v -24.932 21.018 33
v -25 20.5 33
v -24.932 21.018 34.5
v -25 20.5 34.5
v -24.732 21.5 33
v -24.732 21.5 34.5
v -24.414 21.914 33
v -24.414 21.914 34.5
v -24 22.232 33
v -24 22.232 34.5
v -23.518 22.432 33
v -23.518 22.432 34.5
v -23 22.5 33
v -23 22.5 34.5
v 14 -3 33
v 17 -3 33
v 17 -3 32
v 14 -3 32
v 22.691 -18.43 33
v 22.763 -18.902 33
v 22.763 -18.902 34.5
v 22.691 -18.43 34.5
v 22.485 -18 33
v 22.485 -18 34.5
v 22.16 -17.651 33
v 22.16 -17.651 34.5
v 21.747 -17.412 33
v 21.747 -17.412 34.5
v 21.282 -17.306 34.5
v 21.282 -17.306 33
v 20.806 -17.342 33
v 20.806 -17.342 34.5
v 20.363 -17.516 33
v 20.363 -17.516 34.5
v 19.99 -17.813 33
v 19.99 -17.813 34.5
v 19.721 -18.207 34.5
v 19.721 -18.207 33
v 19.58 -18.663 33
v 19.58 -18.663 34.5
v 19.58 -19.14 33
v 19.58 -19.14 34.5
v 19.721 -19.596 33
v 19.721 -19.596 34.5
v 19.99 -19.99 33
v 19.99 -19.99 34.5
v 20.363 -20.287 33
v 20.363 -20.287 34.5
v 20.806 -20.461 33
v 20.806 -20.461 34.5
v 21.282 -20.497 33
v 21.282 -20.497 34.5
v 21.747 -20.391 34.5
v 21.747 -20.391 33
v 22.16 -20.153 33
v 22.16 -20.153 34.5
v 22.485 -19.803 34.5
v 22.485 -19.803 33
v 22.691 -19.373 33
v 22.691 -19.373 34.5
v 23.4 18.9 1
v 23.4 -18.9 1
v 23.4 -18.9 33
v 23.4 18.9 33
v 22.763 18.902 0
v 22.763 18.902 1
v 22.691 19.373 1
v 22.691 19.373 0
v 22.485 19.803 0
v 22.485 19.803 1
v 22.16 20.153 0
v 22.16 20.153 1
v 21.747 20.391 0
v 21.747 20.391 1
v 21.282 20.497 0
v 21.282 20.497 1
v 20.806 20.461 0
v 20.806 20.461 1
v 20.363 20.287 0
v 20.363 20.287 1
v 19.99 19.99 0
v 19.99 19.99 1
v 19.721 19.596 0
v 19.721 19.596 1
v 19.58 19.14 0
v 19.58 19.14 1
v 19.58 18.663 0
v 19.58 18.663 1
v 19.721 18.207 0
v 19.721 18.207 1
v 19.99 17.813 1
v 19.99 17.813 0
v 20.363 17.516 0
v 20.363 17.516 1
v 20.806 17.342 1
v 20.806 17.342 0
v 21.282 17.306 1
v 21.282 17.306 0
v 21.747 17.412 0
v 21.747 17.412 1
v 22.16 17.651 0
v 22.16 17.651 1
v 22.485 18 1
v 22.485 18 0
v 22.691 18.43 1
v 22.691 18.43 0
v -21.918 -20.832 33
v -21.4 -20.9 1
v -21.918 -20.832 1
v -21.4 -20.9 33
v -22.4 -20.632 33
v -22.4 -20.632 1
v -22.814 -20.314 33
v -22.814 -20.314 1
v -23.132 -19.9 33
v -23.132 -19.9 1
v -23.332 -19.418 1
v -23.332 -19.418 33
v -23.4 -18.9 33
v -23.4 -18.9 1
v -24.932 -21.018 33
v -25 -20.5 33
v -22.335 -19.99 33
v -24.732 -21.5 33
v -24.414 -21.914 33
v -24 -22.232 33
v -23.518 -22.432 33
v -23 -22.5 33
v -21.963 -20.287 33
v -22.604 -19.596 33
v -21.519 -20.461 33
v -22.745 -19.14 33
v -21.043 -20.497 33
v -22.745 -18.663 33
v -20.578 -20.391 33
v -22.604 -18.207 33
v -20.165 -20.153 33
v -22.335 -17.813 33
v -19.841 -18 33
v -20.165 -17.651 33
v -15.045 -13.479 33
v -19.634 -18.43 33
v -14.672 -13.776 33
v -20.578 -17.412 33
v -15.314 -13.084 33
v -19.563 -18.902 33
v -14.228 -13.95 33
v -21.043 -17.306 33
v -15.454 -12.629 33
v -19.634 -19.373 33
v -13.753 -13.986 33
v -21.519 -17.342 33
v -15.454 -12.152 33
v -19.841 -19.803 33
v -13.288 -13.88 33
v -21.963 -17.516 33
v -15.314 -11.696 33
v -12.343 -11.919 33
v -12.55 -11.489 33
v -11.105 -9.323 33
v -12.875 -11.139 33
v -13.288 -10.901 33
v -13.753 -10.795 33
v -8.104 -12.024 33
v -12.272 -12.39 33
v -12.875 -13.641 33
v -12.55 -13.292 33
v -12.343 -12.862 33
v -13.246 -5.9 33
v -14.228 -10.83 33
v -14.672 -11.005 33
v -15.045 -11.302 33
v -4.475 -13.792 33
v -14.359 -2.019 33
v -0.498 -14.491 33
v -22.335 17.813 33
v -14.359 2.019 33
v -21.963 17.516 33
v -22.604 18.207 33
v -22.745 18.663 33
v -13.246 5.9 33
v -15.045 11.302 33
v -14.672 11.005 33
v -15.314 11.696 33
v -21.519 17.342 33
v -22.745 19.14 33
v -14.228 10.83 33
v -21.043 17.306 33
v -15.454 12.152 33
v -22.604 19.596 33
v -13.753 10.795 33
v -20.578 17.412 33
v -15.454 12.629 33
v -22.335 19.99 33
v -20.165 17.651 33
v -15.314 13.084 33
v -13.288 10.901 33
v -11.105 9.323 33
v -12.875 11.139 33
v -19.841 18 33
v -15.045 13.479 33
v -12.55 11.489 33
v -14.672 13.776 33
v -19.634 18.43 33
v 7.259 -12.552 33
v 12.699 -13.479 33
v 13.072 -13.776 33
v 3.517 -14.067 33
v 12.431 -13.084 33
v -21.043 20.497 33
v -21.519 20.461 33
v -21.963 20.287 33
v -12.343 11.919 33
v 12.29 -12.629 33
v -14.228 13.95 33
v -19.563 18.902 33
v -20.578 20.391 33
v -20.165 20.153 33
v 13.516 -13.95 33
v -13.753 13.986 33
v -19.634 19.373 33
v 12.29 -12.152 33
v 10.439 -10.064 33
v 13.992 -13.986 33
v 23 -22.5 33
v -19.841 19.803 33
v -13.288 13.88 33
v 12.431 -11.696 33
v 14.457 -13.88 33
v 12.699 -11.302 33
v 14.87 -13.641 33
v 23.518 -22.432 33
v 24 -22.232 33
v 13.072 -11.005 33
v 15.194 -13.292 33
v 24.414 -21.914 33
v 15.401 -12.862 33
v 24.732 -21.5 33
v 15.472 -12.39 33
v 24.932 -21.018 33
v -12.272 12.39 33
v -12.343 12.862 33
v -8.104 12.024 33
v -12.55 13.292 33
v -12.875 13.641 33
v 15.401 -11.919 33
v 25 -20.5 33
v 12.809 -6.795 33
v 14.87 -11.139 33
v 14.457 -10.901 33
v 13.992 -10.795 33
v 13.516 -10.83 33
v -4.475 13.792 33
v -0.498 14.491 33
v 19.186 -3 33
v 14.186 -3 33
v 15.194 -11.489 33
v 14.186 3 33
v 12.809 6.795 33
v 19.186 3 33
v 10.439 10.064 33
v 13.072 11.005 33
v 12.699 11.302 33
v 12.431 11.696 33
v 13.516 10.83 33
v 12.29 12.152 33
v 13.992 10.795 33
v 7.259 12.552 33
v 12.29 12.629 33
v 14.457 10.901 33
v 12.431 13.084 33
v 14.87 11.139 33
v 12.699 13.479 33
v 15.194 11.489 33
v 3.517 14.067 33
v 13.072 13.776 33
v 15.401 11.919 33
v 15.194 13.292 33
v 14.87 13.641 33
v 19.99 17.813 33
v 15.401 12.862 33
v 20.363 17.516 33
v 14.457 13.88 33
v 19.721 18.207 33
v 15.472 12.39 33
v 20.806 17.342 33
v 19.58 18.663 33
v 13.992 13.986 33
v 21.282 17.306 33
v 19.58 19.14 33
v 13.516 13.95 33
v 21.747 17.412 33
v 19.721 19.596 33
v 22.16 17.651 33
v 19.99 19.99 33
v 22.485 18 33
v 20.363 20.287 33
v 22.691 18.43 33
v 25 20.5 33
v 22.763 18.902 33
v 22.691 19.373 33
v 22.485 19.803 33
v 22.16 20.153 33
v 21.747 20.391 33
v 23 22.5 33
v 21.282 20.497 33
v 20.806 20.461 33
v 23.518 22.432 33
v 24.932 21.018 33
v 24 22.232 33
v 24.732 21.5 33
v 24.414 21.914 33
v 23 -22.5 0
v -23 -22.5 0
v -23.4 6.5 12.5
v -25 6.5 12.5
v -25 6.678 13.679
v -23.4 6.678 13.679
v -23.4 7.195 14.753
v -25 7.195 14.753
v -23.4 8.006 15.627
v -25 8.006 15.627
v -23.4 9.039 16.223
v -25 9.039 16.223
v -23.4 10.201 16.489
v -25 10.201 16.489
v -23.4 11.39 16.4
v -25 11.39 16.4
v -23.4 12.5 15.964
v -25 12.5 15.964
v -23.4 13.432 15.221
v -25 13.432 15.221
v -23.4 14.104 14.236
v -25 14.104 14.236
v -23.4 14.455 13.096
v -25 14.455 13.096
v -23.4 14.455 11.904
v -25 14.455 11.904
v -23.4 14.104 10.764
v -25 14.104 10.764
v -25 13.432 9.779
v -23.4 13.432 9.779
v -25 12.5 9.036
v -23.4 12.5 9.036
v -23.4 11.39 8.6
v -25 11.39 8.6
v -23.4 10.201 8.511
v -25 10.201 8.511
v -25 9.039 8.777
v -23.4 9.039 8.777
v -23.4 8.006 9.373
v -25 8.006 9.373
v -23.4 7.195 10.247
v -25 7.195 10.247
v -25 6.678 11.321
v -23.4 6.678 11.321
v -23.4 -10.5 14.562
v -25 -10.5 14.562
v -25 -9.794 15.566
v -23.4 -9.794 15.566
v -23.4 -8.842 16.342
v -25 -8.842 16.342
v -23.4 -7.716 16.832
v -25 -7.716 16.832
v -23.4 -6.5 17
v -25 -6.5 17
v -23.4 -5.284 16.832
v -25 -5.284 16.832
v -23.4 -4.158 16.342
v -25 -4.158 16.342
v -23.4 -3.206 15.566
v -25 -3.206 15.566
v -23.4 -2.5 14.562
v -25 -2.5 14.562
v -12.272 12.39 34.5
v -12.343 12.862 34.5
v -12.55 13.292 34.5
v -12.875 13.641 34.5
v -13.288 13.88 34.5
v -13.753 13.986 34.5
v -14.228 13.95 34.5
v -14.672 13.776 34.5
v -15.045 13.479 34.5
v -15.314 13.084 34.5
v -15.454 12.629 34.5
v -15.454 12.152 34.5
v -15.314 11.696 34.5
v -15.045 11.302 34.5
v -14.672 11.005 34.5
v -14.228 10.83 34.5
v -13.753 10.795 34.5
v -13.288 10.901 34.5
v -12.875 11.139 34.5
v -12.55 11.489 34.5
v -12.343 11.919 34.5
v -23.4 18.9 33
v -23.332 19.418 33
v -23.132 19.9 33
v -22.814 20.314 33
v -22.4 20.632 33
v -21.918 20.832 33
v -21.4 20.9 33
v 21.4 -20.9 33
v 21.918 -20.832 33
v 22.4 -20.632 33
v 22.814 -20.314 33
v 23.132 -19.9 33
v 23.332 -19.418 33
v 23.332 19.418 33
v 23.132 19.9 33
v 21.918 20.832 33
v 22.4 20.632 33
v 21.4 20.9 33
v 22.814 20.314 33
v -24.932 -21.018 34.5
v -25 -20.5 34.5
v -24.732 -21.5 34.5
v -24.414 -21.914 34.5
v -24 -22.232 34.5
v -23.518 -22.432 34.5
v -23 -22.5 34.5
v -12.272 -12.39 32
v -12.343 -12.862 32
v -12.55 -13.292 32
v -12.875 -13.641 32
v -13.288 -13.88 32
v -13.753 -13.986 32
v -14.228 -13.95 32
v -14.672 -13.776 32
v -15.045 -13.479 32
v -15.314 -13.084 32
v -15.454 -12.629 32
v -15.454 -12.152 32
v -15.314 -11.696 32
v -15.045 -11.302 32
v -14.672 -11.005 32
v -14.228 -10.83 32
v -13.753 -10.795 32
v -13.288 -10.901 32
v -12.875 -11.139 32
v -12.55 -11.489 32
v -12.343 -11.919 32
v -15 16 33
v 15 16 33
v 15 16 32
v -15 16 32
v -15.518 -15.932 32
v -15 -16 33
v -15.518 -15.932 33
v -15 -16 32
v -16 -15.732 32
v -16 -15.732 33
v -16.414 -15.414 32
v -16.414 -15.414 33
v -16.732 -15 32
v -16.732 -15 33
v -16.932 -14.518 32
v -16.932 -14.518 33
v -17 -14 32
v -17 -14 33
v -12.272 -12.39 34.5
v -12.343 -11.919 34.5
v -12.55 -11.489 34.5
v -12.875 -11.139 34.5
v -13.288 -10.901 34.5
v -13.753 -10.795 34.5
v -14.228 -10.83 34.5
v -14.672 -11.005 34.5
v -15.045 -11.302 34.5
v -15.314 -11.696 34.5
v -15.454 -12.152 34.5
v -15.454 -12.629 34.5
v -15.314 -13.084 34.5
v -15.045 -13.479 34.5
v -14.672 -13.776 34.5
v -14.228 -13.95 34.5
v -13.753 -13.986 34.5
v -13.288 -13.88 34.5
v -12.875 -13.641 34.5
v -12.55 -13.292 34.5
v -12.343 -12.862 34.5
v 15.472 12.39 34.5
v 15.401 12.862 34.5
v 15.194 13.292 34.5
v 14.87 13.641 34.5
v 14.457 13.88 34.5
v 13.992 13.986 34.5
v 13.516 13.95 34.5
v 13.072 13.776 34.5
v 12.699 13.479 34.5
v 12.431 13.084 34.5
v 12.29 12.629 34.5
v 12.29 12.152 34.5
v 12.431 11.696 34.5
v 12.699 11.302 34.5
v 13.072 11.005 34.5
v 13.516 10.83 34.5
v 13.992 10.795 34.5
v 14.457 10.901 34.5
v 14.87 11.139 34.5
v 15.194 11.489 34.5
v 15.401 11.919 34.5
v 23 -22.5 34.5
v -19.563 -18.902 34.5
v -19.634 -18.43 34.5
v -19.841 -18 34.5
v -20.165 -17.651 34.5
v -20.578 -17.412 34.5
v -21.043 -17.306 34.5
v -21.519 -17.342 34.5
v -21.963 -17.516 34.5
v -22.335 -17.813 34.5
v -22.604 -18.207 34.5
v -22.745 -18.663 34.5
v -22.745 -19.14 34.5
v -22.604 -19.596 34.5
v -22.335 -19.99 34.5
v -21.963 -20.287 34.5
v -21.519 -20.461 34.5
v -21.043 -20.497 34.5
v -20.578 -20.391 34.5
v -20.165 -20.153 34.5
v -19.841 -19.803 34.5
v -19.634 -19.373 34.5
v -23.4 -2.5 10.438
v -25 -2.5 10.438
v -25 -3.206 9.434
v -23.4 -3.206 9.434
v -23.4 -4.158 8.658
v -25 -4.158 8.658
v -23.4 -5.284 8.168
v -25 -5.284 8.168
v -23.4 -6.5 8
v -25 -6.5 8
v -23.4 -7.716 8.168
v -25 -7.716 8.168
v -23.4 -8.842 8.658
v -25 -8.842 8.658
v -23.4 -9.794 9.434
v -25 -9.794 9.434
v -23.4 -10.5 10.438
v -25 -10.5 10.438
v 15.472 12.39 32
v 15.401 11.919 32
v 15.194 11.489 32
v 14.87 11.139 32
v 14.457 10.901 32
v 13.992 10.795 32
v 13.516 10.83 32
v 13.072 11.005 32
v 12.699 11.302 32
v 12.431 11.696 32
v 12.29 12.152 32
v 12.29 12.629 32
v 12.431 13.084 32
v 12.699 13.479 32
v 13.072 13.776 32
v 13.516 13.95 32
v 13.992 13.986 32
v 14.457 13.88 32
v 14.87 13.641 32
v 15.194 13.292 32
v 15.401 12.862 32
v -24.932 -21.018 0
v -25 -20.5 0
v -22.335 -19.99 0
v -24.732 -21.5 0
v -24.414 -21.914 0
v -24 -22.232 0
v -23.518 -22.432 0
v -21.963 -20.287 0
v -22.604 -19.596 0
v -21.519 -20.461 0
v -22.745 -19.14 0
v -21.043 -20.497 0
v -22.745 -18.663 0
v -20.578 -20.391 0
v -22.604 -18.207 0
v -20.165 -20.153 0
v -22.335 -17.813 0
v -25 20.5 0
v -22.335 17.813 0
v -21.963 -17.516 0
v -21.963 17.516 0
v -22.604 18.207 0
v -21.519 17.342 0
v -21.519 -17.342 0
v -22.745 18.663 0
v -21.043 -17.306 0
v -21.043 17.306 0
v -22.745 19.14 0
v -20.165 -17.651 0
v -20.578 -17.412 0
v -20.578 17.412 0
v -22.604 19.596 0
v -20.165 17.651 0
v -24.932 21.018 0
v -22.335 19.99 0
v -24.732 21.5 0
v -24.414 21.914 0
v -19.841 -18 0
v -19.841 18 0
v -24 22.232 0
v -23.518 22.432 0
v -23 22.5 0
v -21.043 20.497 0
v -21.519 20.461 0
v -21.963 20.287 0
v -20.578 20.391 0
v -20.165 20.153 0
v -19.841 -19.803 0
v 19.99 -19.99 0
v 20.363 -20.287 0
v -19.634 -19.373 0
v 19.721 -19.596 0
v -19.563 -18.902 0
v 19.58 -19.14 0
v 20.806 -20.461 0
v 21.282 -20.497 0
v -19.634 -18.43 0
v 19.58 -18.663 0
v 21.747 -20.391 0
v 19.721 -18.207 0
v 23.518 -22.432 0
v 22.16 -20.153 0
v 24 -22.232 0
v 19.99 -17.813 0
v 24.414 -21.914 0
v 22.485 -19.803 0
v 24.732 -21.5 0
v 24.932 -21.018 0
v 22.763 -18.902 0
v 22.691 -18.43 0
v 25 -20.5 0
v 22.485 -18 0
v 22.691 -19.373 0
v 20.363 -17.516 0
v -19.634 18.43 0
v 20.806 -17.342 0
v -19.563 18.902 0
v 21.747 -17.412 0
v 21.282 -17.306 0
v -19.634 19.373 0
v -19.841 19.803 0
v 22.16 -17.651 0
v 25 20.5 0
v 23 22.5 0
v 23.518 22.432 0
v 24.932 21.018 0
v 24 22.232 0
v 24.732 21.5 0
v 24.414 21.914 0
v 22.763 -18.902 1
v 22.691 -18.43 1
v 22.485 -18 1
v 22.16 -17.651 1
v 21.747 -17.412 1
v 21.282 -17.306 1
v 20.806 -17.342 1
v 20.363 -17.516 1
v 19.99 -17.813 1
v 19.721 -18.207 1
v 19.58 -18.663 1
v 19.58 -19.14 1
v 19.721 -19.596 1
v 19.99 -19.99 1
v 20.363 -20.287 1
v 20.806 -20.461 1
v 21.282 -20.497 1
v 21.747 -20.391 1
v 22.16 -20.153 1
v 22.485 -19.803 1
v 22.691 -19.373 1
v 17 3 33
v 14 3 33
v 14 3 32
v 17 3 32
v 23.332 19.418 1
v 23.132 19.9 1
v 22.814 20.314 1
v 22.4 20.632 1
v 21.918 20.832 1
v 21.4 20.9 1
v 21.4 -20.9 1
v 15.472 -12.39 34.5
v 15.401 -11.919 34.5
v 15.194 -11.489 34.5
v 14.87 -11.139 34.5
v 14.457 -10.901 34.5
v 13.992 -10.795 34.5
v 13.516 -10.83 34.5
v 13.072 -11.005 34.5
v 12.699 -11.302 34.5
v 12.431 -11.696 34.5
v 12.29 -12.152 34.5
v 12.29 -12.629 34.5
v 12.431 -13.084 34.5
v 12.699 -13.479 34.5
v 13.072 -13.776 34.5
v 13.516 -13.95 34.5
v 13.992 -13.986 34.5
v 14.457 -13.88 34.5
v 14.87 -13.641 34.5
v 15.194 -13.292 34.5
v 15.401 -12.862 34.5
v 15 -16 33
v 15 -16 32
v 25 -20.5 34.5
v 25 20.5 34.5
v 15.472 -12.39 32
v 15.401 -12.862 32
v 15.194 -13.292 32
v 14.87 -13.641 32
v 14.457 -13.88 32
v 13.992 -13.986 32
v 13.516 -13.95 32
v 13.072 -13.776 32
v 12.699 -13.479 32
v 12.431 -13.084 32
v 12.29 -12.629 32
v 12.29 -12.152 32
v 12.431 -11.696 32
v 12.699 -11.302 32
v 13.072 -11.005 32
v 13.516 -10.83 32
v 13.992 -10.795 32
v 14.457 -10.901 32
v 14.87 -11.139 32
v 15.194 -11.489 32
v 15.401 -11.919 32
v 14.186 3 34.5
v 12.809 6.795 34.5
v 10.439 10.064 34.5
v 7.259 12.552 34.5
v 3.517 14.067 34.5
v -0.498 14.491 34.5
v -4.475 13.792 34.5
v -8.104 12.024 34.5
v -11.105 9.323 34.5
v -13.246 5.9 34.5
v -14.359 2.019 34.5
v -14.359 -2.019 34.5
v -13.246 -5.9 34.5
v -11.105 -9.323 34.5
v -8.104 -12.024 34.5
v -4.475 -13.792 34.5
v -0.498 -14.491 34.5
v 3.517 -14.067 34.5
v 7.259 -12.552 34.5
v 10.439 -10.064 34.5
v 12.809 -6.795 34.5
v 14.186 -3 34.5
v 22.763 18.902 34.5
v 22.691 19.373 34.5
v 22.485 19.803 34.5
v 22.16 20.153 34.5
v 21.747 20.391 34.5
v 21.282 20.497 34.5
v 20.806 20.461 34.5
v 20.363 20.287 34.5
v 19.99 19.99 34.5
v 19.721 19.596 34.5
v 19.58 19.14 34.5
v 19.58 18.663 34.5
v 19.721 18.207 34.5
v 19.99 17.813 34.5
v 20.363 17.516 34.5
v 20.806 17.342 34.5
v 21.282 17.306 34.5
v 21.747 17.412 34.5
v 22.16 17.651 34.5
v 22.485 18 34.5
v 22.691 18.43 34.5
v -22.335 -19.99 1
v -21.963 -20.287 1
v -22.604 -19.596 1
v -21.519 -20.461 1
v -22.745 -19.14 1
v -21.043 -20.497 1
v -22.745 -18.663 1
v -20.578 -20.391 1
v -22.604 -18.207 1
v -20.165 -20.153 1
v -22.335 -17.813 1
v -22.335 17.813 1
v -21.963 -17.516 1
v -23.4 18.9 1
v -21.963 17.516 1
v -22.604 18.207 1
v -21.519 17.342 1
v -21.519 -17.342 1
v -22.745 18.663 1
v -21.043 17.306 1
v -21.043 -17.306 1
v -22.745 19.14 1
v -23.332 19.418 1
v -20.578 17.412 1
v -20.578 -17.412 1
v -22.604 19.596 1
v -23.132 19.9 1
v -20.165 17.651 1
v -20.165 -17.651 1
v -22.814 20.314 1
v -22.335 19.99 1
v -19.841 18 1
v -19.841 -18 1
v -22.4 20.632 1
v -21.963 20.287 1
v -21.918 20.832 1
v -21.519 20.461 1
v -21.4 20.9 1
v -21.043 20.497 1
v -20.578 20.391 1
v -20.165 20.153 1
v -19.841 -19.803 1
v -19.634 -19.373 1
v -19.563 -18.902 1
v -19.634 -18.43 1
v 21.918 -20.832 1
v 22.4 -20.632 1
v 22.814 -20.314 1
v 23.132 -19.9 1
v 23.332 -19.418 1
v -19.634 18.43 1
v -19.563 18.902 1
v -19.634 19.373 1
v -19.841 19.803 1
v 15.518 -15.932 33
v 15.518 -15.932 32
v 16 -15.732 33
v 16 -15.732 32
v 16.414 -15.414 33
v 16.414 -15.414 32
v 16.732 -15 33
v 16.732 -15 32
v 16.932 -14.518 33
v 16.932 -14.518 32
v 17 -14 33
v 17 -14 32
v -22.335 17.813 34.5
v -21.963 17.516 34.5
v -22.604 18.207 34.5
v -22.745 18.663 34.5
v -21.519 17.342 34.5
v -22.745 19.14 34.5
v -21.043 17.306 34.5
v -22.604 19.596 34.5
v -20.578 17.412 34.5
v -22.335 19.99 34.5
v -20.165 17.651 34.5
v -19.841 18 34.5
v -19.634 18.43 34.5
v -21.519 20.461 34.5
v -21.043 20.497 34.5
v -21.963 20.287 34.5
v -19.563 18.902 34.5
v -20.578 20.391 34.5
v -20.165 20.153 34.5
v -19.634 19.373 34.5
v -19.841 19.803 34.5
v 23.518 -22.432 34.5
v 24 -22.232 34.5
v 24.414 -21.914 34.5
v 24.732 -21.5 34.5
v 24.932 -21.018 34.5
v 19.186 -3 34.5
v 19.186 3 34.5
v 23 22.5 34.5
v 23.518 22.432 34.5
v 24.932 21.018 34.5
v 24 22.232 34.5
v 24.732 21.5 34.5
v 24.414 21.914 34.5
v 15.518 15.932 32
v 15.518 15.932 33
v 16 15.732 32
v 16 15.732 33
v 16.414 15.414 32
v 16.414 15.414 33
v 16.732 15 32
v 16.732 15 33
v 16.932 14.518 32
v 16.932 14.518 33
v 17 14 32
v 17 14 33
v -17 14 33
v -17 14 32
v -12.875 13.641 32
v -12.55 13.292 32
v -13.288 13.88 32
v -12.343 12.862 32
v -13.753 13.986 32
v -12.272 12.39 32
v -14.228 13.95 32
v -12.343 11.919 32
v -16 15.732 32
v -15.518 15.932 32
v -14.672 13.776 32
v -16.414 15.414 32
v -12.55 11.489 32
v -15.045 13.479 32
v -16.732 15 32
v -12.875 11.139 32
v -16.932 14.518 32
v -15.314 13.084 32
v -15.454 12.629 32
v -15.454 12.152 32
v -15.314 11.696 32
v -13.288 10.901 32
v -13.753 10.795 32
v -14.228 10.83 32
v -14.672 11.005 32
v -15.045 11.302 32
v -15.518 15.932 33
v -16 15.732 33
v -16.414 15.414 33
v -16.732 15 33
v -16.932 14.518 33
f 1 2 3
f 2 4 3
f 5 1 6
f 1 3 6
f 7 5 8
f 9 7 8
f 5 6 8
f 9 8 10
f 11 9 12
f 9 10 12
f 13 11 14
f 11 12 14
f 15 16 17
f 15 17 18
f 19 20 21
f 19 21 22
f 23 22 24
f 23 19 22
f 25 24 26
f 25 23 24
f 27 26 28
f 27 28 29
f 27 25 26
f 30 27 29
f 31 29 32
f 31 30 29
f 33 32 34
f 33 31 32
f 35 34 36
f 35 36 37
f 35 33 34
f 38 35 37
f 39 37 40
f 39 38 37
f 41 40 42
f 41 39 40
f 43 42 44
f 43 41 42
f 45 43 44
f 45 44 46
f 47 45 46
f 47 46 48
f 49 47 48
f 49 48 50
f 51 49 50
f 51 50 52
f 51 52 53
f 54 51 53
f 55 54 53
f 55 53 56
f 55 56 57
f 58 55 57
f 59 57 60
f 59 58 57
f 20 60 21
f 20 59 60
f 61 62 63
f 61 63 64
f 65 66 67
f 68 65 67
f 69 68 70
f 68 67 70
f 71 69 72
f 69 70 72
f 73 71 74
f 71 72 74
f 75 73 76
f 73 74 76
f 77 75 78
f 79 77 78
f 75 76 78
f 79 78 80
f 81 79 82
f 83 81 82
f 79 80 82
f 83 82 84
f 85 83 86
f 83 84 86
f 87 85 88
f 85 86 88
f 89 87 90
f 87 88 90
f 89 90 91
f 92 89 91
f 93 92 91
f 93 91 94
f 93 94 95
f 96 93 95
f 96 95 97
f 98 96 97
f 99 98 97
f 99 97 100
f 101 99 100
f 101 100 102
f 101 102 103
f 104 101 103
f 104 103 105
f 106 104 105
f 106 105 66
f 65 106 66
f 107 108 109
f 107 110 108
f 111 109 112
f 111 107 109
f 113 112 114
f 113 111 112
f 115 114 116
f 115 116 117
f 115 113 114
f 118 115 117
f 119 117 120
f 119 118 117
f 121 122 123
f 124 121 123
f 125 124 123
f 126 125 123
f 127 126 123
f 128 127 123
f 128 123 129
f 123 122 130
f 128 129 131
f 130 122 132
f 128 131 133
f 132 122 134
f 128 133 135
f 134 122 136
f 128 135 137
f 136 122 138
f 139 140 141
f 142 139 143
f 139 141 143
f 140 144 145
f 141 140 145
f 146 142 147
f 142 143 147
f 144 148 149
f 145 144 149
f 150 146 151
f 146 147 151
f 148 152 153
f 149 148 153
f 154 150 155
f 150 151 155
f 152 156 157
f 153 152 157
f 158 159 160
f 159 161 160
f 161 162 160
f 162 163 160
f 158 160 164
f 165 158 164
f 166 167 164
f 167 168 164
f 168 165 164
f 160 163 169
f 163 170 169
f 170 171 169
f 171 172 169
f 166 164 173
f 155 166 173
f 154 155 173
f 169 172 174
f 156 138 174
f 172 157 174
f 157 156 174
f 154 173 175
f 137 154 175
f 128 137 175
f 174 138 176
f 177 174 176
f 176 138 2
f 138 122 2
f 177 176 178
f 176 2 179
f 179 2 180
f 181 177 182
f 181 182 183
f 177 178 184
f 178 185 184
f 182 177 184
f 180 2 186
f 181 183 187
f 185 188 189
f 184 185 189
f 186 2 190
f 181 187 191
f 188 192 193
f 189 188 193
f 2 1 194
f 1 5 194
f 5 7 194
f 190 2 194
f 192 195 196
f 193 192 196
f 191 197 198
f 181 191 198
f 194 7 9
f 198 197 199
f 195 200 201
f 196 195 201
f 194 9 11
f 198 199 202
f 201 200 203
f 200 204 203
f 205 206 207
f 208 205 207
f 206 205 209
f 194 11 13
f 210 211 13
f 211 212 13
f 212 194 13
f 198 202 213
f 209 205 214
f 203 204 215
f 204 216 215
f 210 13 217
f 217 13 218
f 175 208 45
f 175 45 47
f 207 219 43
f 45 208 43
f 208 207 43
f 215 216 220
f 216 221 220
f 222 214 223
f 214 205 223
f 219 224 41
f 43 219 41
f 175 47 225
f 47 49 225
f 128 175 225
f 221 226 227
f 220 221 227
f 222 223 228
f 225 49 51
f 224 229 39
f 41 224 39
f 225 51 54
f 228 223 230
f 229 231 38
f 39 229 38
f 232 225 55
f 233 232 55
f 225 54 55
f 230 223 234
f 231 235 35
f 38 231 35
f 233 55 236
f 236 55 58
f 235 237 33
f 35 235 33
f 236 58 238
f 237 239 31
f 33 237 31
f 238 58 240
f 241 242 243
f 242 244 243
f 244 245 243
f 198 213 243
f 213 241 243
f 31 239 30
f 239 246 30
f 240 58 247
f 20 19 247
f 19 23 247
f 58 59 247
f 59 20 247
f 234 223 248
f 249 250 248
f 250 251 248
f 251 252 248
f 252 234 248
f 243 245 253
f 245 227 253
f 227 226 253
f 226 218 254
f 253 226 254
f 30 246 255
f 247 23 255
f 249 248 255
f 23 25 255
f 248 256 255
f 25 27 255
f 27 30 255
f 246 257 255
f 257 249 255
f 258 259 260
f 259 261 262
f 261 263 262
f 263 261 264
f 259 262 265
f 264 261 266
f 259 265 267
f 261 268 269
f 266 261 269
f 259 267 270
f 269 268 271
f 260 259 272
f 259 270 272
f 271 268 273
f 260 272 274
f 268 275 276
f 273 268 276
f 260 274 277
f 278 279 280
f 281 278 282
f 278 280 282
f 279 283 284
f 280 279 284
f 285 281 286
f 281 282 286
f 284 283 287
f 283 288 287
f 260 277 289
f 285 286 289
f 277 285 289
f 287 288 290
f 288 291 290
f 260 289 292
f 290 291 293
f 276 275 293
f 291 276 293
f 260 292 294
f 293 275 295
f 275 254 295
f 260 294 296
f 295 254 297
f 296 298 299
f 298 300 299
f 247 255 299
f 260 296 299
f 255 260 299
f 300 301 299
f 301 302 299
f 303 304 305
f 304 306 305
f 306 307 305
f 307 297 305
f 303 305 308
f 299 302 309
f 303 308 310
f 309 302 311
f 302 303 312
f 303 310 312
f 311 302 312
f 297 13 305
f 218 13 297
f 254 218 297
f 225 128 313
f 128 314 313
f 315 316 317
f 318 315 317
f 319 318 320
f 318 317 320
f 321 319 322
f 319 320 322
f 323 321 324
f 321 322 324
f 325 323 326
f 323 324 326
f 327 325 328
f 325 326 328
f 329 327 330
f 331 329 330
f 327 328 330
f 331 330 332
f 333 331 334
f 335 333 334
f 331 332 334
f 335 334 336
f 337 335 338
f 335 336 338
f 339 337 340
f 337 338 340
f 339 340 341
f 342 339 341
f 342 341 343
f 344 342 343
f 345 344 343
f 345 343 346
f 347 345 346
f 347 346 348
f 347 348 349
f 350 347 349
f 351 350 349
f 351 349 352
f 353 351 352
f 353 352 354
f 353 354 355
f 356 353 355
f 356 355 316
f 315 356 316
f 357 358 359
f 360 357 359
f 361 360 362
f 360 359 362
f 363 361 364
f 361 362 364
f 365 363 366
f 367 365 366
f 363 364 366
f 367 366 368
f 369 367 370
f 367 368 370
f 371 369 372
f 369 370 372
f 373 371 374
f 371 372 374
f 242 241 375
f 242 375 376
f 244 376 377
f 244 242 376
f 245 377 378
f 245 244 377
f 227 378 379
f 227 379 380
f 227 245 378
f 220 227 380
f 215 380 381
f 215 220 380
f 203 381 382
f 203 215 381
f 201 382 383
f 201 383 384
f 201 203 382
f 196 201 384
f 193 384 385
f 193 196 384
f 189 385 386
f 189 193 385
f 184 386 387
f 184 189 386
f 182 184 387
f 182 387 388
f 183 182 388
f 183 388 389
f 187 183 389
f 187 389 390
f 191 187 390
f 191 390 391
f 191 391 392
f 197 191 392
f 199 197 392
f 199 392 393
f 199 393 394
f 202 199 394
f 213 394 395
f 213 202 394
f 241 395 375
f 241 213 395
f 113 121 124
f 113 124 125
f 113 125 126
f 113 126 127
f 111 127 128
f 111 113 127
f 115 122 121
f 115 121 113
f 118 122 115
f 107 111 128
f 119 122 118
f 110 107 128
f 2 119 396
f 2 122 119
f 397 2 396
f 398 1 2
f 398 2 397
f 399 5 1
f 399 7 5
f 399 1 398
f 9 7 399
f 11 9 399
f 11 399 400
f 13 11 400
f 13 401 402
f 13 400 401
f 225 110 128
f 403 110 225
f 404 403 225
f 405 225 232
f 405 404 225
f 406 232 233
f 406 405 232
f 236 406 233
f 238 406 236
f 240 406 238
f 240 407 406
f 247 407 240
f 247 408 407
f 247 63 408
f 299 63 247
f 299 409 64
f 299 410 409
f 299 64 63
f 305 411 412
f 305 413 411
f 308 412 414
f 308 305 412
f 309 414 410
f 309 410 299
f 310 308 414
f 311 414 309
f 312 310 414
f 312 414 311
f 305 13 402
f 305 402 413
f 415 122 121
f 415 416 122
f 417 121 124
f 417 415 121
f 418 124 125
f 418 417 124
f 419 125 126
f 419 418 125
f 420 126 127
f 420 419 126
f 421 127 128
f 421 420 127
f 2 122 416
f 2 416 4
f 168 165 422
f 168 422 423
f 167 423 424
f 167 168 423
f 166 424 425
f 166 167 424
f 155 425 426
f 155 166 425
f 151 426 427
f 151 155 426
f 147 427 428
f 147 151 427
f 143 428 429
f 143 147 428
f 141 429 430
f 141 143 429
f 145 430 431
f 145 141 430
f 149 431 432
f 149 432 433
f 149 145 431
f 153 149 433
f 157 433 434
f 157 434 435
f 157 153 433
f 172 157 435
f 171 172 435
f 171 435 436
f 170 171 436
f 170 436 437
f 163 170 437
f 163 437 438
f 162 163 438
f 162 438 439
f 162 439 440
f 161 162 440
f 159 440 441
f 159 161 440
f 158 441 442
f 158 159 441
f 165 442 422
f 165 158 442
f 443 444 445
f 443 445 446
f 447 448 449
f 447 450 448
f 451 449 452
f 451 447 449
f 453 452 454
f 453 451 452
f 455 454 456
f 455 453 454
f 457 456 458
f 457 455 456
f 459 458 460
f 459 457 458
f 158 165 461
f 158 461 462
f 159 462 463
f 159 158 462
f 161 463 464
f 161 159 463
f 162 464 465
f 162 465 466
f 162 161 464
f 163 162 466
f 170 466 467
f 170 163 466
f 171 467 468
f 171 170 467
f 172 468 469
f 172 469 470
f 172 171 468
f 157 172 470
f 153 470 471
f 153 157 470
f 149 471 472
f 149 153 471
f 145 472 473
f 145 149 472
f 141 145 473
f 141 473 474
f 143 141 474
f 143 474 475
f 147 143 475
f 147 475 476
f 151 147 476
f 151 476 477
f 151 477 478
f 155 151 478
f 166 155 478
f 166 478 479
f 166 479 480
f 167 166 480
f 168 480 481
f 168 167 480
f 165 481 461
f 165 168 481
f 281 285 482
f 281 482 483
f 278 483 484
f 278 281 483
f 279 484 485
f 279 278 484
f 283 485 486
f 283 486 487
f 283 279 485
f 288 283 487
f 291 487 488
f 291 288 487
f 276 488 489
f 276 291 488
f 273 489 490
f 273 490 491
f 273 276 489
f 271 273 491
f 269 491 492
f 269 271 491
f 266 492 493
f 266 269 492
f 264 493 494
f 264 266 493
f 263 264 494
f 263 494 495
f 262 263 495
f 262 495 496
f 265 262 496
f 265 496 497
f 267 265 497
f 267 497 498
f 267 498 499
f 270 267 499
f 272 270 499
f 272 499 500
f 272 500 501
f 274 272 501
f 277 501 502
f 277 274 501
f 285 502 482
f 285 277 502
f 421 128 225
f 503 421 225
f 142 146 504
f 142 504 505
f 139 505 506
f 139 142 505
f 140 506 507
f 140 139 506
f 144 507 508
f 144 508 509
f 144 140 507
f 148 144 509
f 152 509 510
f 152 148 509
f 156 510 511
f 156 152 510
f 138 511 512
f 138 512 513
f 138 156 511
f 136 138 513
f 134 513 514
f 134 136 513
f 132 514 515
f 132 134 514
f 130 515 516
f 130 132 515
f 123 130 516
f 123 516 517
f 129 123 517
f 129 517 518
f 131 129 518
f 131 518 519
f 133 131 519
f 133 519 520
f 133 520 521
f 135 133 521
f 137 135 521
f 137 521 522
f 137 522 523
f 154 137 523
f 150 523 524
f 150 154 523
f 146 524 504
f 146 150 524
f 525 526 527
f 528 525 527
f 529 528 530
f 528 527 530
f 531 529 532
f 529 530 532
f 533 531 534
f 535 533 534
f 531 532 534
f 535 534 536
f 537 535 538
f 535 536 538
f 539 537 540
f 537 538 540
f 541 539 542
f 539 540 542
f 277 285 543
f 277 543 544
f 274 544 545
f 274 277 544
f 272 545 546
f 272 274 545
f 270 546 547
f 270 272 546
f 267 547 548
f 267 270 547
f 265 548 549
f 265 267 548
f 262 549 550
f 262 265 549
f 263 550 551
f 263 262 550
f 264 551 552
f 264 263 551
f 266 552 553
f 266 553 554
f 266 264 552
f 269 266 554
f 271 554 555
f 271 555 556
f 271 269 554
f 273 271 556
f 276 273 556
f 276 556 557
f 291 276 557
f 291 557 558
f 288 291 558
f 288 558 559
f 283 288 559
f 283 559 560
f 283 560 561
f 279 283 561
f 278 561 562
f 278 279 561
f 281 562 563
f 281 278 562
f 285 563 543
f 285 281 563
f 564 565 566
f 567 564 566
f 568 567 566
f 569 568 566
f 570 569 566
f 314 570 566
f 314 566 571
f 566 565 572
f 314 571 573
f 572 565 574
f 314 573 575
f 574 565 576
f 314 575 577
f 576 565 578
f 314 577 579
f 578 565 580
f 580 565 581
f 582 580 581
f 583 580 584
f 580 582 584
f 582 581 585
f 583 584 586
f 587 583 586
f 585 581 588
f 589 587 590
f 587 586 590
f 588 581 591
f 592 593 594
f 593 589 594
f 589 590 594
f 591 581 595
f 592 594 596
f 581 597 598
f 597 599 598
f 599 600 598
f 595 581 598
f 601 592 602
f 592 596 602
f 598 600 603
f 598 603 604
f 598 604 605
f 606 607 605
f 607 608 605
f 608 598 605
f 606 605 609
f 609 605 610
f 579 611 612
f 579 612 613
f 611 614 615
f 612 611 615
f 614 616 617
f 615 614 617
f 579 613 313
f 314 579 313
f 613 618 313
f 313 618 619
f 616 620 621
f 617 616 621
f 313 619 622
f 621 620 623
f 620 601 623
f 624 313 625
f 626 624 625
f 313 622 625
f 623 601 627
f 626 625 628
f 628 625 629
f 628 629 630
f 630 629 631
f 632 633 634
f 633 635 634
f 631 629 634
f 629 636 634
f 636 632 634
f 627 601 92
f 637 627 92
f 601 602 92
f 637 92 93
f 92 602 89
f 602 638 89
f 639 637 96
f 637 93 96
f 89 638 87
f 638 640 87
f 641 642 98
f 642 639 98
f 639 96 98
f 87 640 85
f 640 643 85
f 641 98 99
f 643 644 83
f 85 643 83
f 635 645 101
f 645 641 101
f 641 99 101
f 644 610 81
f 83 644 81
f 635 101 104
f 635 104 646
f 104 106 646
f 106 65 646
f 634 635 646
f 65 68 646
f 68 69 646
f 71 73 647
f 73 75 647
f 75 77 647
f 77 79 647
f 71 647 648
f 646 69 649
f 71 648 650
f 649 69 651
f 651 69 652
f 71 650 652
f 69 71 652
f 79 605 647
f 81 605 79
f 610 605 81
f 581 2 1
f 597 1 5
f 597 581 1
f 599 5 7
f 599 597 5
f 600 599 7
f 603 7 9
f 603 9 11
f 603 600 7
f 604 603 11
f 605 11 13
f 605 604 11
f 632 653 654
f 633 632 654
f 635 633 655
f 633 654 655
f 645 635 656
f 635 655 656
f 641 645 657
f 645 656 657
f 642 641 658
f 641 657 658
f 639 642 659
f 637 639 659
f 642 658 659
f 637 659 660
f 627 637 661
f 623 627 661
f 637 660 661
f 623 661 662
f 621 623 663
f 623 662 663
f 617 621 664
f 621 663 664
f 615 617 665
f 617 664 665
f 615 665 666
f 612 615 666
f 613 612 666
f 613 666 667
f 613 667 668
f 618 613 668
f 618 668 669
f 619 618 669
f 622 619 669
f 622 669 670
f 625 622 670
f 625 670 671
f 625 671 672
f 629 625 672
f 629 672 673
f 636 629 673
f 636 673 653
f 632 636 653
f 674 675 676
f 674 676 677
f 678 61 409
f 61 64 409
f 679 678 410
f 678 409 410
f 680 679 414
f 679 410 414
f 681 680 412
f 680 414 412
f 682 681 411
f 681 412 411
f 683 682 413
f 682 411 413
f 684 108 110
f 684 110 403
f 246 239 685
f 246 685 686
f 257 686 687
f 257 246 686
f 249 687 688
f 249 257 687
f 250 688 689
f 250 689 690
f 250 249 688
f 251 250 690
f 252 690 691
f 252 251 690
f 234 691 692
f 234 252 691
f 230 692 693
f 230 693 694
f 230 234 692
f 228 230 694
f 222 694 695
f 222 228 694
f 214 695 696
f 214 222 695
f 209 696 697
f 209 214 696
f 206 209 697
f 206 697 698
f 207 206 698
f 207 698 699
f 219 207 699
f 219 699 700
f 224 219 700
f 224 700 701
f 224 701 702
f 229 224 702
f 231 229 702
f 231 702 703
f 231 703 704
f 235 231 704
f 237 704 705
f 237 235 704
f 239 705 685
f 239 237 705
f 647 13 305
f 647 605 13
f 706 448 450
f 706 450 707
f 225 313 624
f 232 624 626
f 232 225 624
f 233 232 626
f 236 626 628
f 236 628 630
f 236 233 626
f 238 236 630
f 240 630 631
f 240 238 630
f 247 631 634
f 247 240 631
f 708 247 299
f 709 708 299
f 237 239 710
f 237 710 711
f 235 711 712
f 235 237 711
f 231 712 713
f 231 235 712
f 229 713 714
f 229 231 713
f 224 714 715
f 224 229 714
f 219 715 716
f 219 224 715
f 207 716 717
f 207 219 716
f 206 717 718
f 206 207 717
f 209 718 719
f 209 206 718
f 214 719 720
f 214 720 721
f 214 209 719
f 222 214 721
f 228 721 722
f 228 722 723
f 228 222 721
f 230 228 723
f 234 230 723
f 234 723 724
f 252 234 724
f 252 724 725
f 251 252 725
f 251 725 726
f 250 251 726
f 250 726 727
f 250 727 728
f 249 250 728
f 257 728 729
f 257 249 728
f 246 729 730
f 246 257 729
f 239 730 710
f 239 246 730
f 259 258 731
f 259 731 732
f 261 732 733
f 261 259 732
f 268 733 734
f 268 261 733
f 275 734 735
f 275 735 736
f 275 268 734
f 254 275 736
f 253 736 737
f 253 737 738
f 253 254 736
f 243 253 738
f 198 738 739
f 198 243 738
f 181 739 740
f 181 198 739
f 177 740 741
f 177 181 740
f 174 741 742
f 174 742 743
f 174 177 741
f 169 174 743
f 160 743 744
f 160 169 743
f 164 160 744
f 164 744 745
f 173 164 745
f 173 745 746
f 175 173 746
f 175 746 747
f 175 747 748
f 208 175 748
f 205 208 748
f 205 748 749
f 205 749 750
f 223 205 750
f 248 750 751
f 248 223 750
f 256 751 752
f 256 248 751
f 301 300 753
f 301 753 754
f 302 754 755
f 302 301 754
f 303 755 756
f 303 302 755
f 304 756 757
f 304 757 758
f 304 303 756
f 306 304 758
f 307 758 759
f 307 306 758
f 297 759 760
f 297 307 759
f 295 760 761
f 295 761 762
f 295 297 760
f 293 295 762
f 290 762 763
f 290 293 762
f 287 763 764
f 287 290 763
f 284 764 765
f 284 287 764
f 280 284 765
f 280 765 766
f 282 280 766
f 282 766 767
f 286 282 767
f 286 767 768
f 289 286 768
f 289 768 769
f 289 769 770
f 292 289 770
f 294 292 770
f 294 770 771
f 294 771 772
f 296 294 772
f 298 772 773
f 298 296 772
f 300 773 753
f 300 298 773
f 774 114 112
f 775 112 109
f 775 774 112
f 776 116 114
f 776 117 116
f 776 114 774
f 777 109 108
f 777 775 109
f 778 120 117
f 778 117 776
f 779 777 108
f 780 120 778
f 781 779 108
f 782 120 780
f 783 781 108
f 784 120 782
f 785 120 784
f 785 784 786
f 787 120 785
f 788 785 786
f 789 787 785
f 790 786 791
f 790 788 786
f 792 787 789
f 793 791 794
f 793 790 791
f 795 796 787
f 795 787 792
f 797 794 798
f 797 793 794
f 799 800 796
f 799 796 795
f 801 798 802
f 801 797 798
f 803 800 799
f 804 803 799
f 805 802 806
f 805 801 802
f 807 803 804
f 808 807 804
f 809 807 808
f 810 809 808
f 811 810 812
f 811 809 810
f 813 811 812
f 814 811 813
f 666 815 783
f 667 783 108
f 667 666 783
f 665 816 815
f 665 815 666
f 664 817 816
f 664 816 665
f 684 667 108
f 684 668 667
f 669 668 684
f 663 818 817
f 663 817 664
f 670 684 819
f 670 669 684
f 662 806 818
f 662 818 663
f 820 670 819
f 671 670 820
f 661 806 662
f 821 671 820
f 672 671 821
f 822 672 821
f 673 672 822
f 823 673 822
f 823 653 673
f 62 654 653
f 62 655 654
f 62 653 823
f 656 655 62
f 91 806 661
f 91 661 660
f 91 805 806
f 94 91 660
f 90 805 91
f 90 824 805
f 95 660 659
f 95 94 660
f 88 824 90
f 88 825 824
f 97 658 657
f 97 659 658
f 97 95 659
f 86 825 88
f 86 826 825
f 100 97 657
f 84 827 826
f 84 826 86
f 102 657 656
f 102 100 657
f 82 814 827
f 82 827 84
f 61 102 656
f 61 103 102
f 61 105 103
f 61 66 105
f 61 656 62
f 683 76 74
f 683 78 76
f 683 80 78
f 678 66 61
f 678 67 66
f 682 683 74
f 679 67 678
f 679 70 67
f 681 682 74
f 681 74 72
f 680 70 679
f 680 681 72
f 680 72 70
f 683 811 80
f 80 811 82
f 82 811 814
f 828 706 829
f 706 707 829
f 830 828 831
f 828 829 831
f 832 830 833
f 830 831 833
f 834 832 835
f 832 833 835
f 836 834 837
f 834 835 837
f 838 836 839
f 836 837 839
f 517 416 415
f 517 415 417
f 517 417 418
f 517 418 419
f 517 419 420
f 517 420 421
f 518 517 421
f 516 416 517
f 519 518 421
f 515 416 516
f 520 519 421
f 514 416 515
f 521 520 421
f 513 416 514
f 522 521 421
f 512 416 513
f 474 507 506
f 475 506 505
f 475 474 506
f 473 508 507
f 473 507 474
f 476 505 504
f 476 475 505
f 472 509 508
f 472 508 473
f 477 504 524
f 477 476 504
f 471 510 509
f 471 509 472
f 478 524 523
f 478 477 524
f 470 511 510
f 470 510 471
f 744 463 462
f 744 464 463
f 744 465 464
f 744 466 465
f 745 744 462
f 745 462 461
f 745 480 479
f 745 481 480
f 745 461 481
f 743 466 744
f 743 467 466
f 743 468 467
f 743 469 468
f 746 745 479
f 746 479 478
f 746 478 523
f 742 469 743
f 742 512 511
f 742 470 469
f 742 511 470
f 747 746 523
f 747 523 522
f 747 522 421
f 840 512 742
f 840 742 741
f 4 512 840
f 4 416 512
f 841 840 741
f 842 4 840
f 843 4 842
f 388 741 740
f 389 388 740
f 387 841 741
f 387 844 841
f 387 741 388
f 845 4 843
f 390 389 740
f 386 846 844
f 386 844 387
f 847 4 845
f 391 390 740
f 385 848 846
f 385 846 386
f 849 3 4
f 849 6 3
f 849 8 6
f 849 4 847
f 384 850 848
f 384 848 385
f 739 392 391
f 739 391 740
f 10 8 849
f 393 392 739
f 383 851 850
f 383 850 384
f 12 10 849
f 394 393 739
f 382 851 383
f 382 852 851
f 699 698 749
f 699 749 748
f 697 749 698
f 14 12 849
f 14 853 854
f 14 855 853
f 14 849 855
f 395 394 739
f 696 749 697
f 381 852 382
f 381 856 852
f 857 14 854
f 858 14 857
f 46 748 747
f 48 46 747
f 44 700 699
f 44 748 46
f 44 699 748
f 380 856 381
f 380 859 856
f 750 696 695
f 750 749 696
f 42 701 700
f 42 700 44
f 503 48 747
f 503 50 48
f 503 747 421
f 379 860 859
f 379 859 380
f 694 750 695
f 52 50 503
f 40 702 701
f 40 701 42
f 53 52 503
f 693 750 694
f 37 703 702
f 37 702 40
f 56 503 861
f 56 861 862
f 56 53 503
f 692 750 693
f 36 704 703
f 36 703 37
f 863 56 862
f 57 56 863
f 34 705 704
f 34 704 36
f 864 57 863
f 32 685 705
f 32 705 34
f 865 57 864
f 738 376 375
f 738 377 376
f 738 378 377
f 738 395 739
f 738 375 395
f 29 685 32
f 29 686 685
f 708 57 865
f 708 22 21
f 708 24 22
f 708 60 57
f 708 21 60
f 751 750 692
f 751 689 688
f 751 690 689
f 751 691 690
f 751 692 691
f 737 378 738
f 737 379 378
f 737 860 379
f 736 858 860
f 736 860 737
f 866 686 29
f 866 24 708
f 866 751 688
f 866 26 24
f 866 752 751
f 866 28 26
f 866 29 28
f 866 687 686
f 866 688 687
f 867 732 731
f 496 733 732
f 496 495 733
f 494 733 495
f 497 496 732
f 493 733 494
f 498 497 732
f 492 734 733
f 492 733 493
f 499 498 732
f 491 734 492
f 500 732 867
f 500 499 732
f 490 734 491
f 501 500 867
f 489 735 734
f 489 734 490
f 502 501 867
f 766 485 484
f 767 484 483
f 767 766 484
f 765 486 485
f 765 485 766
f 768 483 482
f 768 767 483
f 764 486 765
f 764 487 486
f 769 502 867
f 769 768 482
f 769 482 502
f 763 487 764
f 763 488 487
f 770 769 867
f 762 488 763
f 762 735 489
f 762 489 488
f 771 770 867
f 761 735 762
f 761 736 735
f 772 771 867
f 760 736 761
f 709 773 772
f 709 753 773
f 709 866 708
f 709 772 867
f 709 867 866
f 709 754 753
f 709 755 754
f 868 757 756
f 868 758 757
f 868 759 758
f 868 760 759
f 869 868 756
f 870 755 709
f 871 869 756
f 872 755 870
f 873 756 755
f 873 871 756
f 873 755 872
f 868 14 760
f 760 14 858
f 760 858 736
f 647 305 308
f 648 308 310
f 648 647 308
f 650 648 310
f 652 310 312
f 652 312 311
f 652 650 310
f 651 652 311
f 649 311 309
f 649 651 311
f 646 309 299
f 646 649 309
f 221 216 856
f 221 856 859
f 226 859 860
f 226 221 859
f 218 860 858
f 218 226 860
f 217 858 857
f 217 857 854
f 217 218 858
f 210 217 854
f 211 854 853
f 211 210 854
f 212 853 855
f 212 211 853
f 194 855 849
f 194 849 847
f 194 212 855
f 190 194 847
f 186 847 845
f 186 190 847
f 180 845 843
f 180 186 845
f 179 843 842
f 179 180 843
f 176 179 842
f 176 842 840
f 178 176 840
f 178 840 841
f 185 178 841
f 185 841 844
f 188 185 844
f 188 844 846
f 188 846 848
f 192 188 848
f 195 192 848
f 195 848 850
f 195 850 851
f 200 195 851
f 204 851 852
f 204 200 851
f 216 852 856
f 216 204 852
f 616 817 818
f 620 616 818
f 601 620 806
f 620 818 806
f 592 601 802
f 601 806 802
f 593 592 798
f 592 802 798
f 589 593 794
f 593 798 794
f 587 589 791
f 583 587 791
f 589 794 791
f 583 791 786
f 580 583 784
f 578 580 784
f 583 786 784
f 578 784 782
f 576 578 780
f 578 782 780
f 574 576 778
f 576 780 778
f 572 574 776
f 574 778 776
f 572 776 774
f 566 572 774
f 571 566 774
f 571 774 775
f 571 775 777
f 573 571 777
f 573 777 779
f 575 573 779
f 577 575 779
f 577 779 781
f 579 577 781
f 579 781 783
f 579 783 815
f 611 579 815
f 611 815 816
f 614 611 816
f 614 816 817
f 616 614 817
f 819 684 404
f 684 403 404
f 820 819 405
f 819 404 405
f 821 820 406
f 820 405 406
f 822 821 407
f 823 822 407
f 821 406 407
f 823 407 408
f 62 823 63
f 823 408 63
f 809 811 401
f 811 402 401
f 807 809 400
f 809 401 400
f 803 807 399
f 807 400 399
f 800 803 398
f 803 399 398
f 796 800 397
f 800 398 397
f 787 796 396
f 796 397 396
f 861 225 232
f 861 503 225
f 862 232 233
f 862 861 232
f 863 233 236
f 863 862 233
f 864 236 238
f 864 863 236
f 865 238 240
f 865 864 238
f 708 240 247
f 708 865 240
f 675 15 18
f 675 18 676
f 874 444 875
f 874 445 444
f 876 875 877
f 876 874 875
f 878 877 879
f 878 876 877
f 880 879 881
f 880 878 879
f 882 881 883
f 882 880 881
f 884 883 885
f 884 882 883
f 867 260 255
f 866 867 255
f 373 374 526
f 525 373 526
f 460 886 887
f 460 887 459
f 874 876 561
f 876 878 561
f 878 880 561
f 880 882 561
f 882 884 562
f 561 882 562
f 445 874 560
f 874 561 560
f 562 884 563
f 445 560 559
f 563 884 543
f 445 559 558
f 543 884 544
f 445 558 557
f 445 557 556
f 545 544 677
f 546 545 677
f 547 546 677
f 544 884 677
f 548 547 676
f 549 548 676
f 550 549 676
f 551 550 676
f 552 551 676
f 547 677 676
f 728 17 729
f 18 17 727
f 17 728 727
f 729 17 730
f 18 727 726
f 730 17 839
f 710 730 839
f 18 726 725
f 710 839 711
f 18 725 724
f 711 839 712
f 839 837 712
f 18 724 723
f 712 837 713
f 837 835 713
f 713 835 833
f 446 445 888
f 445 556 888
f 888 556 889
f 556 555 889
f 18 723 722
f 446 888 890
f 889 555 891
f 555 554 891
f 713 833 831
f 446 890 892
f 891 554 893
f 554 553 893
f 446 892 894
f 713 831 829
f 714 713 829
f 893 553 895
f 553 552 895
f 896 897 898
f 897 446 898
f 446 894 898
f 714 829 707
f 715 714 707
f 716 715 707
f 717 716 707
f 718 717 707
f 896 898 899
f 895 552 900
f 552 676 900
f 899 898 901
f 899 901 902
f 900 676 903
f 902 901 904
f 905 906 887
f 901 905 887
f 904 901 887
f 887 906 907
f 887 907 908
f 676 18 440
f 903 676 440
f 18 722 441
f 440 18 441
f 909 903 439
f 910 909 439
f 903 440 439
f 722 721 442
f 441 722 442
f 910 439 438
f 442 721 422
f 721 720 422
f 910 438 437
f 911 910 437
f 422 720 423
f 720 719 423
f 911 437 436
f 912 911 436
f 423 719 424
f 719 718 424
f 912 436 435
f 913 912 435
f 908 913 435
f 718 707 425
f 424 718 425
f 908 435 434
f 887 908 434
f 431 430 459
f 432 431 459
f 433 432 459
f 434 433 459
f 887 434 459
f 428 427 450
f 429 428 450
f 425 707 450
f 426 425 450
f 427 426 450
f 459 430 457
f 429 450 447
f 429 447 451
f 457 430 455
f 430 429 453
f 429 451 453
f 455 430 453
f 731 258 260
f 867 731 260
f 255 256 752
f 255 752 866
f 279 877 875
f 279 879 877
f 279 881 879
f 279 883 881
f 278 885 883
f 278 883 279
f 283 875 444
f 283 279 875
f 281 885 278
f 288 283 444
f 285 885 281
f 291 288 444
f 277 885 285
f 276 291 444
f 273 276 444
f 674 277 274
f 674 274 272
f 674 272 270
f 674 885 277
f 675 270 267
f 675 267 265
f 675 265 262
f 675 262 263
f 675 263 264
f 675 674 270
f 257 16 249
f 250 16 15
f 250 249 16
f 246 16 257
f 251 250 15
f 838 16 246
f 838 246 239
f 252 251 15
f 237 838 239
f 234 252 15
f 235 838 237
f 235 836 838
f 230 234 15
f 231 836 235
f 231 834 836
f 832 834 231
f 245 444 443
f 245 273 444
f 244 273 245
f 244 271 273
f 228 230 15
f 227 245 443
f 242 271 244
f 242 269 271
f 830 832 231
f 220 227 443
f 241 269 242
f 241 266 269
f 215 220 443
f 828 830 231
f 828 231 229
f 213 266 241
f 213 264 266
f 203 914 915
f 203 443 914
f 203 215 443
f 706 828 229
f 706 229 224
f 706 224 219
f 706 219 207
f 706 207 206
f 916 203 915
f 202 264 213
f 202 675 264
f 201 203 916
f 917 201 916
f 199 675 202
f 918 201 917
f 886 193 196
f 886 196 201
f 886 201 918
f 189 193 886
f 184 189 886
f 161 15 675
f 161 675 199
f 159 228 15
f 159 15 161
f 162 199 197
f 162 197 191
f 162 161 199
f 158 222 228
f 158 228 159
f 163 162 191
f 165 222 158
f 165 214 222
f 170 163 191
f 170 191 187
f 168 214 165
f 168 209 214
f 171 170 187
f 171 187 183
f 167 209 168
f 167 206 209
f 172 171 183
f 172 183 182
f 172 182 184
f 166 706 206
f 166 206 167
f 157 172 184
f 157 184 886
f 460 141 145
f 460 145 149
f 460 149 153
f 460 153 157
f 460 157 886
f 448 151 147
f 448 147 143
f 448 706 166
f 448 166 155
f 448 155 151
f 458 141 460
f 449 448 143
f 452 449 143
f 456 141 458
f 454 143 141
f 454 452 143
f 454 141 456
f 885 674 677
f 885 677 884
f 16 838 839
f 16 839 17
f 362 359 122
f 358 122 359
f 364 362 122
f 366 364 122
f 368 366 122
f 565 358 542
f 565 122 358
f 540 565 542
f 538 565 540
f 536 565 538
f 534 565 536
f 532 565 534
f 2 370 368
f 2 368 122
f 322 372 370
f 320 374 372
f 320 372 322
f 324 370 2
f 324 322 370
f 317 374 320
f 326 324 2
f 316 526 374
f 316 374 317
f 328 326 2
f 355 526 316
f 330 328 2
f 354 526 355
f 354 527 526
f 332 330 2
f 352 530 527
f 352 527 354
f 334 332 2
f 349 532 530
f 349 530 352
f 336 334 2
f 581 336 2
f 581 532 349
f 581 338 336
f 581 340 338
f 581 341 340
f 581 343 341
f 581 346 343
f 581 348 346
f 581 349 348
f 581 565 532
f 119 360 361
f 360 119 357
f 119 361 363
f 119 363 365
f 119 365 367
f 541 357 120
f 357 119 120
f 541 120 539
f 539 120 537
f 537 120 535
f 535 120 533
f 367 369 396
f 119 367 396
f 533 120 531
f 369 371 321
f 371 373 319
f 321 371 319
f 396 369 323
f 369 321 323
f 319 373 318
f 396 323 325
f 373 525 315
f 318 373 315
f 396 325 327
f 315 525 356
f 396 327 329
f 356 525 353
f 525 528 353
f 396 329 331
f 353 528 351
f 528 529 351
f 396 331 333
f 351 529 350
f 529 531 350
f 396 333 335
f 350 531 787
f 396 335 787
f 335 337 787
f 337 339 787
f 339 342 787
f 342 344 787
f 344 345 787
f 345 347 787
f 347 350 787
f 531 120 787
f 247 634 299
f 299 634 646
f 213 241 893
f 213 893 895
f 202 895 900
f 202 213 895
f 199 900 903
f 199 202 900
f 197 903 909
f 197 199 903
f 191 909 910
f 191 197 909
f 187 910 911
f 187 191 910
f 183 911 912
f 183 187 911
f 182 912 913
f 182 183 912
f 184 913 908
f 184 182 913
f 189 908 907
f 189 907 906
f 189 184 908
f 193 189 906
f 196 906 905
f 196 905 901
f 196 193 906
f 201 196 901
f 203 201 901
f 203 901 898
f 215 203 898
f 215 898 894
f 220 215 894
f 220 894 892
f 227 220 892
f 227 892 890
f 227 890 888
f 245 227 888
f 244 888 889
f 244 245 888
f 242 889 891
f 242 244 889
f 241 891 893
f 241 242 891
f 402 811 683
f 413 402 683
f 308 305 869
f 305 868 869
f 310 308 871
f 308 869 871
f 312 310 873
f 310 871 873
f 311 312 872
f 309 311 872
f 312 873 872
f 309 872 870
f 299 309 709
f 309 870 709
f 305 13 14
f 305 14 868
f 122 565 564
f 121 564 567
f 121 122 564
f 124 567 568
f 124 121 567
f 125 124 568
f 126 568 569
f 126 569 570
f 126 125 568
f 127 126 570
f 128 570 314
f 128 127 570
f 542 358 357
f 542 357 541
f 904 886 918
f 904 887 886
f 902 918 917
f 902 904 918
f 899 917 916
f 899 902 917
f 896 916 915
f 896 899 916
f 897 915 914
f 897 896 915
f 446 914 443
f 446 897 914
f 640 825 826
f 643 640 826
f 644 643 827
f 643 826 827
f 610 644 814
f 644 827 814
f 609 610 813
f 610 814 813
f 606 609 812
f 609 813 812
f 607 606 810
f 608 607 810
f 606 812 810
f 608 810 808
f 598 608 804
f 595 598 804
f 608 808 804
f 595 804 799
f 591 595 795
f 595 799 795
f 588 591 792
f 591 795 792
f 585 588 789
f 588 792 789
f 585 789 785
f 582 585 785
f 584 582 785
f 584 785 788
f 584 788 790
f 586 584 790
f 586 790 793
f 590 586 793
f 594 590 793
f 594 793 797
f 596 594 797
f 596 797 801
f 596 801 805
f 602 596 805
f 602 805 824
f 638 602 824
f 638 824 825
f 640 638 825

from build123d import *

# Parameters (mm, degrees)
SKETCH_W        = 50
SKETCH_H        = 45
PAD_DEPTH       = 1
SKETCH001_W     = 50
SKETCH001_H     = 45
SKETCH001_W_2   = 46.8
SKETCH001_H_2   = 41.8
PAD001_DEPTH    = 32
SKETCH002_R     = 1.6
POCKET_DEPTH    = 5
SKETCH003_R     = 4
POCKET001_DEPTH = 5
FILLET001_R     = 2
SKETCH004_W     = 50
SKETCH004_H     = 45
SKETCH004_R     = 1.6
PAD002_DEPTH    = 1.5
FILLET_R        = 2
SKETCH005_R     = 1.6
PAD003_DEPTH    = 1
FILLET002_R     = 2


with BuildPart() as body:
    # Sketch → Pad (new body)
    with BuildSketch(Plane.XY):
        Rectangle(SKETCH_W, SKETCH_H)
    extrude(amount=PAD_DEPTH)

    # Sketch001 (on Face6 of Pad) → Pad001 (join)
    with BuildSketch(Plane.XY.offset(1)):
        Rectangle(SKETCH001_W, SKETCH001_H)
        Rectangle(SKETCH001_W_2, SKETCH001_H_2, mode=Mode.SUBTRACT)
    extrude(amount=PAD001_DEPTH)

    # Sketch002 (on Face15 of Pad001) → Pocket (cut)
    with BuildSketch(Plane.XY.offset(1)):
        with Locations((-21.162526, 18.901573)):
            Circle(SKETCH002_R)
        with Locations((21.162526, 18.901573)):
            Circle(SKETCH002_R)
        with Locations((21.162526, -18.901573)):
            Circle(SKETCH002_R)
        with Locations((-21.162526, -18.901573)):
            Circle(SKETCH002_R)
    extrude(amount=-POCKET_DEPTH, mode=Mode.SUBTRACT)

    # Sketch003 → Pocket001 (cut)
    with BuildSketch(Plane(origin=(-25, 0, 0), x_dir=(0, -1, 0), z_dir=(-1, 0, 0))):
        with Locations((-10.5, 12.5)):
            Circle(SKETCH003_R)
        with BuildLine():
            ThreePointArc((2.5, 10.438447), (6.5, 8), (10.5, 10.438447))
            Line((10.5, 14.561553), (10.5, 10.438447))
            ThreePointArc((10.5, 14.561553), (6.5, 17), (2.5, 14.561553))
            Line((2.5, 14.561553), (2.5, 10.438447))
        make_face()
    extrude(amount=-POCKET001_DEPTH, mode=Mode.SUBTRACT)

    # Fillet001
    fillet001_edges = [body.edges().sort_by_distance(p)[0] for p in [
        (-23.4, 20.9, 17),
        (25, -22.5, 17),
        (25, 22.5, 17),
        (-25, -22.5, 17),
        (23.4, -20.9, 17),
        (-25, 22.5, 17),
        (23.4, 20.9, 17),
        (-23.4, -20.9, 17),
    ]]
    fillet(fillet001_edges, radius=FILLET001_R)


with BuildPart() as lid:
    # Sketch004 (on Face1 of ReferencePocket001001) → Pad002 (new body)
    with BuildSketch(Plane.XY.offset(33)):
        Rectangle(SKETCH004_W, SKETCH004_H)
        with Locations((-21.162526, 18.901573)):
            Circle(SKETCH004_R, mode=Mode.SUBTRACT)
        with Locations((21.162526, 18.901573)):
            Circle(SKETCH004_R, mode=Mode.SUBTRACT)
        with Locations((21.162526, -18.901573)):
            Circle(SKETCH004_R, mode=Mode.SUBTRACT)
        with Locations((-21.162526, -18.901573)):
            Circle(SKETCH004_R, mode=Mode.SUBTRACT)
        with Locations((13.872337, 12.390249)):
            Circle(SKETCH004_R, mode=Mode.SUBTRACT)
        with Locations((-13.872337, 12.390249)):
            Circle(SKETCH004_R, mode=Mode.SUBTRACT)
        with Locations((-13.872337, -12.390249)):
            Circle(SKETCH004_R, mode=Mode.SUBTRACT)
        with Locations((13.872337, -12.390249)):
            Circle(SKETCH004_R, mode=Mode.SUBTRACT)
        with BuildLine():
            ThreePointArc((14.186261, 3), (-14.5, 0), (14.186261, -3))
            Line((14.186261, -3), (19.186261, -3))
            Line((19.186261, 3), (19.186261, -3))
            Line((14.186261, 3), (19.186261, 3))
        make_face(mode=Mode.SUBTRACT)
    extrude(amount=PAD002_DEPTH)

    # Fillet
    fillet_edges = [lid.edges().sort_by_distance(p)[0] for p in [
        (25, -22.5, 33.75),
        (-25, -22.5, 33.75),
        (25, 22.5, 33.75),
        (-25, 22.5, 33.75),
    ]]
    fillet(fillet_edges, radius=FILLET_R)


with BuildPart() as socketholder:
    # Sketch005 (on Face1 of ReferenceFillet) → Pad003 (new body)
    with BuildSketch(Plane(origin=(0, 0, 33), x_dir=(1, 0, 0), z_dir=(0, 0, -1))):
        Polygon((-17, 16), (17, 16), (17, 3), (14, 3), (14, -3), (17, -3), (17, -16), (-17, -16), align=None)
        with Locations((-13.872343, 12.390242)):
            Circle(SKETCH005_R, mode=Mode.SUBTRACT)
        with Locations((13.872343, 12.390242)):
            Circle(SKETCH005_R, mode=Mode.SUBTRACT)
        with Locations((13.872343, -12.390242)):
            Circle(SKETCH005_R, mode=Mode.SUBTRACT)
        with Locations((-13.872343, -12.390242)):
            Circle(SKETCH005_R, mode=Mode.SUBTRACT)
    extrude(amount=PAD003_DEPTH)

    # Fillet002
    fillet002_edges = [socketholder.edges().sort_by_distance(p)[0] for p in [
        (-17, -16, 32.5),
        (-17, 16, 32.5),
        (17, 16, 32.5),
        (17, -16, 32.5),
    ]]
    fillet(fillet002_edges, radius=FILLET002_R)


solid = Compound([body.part, lid.part, socketholder.part])
